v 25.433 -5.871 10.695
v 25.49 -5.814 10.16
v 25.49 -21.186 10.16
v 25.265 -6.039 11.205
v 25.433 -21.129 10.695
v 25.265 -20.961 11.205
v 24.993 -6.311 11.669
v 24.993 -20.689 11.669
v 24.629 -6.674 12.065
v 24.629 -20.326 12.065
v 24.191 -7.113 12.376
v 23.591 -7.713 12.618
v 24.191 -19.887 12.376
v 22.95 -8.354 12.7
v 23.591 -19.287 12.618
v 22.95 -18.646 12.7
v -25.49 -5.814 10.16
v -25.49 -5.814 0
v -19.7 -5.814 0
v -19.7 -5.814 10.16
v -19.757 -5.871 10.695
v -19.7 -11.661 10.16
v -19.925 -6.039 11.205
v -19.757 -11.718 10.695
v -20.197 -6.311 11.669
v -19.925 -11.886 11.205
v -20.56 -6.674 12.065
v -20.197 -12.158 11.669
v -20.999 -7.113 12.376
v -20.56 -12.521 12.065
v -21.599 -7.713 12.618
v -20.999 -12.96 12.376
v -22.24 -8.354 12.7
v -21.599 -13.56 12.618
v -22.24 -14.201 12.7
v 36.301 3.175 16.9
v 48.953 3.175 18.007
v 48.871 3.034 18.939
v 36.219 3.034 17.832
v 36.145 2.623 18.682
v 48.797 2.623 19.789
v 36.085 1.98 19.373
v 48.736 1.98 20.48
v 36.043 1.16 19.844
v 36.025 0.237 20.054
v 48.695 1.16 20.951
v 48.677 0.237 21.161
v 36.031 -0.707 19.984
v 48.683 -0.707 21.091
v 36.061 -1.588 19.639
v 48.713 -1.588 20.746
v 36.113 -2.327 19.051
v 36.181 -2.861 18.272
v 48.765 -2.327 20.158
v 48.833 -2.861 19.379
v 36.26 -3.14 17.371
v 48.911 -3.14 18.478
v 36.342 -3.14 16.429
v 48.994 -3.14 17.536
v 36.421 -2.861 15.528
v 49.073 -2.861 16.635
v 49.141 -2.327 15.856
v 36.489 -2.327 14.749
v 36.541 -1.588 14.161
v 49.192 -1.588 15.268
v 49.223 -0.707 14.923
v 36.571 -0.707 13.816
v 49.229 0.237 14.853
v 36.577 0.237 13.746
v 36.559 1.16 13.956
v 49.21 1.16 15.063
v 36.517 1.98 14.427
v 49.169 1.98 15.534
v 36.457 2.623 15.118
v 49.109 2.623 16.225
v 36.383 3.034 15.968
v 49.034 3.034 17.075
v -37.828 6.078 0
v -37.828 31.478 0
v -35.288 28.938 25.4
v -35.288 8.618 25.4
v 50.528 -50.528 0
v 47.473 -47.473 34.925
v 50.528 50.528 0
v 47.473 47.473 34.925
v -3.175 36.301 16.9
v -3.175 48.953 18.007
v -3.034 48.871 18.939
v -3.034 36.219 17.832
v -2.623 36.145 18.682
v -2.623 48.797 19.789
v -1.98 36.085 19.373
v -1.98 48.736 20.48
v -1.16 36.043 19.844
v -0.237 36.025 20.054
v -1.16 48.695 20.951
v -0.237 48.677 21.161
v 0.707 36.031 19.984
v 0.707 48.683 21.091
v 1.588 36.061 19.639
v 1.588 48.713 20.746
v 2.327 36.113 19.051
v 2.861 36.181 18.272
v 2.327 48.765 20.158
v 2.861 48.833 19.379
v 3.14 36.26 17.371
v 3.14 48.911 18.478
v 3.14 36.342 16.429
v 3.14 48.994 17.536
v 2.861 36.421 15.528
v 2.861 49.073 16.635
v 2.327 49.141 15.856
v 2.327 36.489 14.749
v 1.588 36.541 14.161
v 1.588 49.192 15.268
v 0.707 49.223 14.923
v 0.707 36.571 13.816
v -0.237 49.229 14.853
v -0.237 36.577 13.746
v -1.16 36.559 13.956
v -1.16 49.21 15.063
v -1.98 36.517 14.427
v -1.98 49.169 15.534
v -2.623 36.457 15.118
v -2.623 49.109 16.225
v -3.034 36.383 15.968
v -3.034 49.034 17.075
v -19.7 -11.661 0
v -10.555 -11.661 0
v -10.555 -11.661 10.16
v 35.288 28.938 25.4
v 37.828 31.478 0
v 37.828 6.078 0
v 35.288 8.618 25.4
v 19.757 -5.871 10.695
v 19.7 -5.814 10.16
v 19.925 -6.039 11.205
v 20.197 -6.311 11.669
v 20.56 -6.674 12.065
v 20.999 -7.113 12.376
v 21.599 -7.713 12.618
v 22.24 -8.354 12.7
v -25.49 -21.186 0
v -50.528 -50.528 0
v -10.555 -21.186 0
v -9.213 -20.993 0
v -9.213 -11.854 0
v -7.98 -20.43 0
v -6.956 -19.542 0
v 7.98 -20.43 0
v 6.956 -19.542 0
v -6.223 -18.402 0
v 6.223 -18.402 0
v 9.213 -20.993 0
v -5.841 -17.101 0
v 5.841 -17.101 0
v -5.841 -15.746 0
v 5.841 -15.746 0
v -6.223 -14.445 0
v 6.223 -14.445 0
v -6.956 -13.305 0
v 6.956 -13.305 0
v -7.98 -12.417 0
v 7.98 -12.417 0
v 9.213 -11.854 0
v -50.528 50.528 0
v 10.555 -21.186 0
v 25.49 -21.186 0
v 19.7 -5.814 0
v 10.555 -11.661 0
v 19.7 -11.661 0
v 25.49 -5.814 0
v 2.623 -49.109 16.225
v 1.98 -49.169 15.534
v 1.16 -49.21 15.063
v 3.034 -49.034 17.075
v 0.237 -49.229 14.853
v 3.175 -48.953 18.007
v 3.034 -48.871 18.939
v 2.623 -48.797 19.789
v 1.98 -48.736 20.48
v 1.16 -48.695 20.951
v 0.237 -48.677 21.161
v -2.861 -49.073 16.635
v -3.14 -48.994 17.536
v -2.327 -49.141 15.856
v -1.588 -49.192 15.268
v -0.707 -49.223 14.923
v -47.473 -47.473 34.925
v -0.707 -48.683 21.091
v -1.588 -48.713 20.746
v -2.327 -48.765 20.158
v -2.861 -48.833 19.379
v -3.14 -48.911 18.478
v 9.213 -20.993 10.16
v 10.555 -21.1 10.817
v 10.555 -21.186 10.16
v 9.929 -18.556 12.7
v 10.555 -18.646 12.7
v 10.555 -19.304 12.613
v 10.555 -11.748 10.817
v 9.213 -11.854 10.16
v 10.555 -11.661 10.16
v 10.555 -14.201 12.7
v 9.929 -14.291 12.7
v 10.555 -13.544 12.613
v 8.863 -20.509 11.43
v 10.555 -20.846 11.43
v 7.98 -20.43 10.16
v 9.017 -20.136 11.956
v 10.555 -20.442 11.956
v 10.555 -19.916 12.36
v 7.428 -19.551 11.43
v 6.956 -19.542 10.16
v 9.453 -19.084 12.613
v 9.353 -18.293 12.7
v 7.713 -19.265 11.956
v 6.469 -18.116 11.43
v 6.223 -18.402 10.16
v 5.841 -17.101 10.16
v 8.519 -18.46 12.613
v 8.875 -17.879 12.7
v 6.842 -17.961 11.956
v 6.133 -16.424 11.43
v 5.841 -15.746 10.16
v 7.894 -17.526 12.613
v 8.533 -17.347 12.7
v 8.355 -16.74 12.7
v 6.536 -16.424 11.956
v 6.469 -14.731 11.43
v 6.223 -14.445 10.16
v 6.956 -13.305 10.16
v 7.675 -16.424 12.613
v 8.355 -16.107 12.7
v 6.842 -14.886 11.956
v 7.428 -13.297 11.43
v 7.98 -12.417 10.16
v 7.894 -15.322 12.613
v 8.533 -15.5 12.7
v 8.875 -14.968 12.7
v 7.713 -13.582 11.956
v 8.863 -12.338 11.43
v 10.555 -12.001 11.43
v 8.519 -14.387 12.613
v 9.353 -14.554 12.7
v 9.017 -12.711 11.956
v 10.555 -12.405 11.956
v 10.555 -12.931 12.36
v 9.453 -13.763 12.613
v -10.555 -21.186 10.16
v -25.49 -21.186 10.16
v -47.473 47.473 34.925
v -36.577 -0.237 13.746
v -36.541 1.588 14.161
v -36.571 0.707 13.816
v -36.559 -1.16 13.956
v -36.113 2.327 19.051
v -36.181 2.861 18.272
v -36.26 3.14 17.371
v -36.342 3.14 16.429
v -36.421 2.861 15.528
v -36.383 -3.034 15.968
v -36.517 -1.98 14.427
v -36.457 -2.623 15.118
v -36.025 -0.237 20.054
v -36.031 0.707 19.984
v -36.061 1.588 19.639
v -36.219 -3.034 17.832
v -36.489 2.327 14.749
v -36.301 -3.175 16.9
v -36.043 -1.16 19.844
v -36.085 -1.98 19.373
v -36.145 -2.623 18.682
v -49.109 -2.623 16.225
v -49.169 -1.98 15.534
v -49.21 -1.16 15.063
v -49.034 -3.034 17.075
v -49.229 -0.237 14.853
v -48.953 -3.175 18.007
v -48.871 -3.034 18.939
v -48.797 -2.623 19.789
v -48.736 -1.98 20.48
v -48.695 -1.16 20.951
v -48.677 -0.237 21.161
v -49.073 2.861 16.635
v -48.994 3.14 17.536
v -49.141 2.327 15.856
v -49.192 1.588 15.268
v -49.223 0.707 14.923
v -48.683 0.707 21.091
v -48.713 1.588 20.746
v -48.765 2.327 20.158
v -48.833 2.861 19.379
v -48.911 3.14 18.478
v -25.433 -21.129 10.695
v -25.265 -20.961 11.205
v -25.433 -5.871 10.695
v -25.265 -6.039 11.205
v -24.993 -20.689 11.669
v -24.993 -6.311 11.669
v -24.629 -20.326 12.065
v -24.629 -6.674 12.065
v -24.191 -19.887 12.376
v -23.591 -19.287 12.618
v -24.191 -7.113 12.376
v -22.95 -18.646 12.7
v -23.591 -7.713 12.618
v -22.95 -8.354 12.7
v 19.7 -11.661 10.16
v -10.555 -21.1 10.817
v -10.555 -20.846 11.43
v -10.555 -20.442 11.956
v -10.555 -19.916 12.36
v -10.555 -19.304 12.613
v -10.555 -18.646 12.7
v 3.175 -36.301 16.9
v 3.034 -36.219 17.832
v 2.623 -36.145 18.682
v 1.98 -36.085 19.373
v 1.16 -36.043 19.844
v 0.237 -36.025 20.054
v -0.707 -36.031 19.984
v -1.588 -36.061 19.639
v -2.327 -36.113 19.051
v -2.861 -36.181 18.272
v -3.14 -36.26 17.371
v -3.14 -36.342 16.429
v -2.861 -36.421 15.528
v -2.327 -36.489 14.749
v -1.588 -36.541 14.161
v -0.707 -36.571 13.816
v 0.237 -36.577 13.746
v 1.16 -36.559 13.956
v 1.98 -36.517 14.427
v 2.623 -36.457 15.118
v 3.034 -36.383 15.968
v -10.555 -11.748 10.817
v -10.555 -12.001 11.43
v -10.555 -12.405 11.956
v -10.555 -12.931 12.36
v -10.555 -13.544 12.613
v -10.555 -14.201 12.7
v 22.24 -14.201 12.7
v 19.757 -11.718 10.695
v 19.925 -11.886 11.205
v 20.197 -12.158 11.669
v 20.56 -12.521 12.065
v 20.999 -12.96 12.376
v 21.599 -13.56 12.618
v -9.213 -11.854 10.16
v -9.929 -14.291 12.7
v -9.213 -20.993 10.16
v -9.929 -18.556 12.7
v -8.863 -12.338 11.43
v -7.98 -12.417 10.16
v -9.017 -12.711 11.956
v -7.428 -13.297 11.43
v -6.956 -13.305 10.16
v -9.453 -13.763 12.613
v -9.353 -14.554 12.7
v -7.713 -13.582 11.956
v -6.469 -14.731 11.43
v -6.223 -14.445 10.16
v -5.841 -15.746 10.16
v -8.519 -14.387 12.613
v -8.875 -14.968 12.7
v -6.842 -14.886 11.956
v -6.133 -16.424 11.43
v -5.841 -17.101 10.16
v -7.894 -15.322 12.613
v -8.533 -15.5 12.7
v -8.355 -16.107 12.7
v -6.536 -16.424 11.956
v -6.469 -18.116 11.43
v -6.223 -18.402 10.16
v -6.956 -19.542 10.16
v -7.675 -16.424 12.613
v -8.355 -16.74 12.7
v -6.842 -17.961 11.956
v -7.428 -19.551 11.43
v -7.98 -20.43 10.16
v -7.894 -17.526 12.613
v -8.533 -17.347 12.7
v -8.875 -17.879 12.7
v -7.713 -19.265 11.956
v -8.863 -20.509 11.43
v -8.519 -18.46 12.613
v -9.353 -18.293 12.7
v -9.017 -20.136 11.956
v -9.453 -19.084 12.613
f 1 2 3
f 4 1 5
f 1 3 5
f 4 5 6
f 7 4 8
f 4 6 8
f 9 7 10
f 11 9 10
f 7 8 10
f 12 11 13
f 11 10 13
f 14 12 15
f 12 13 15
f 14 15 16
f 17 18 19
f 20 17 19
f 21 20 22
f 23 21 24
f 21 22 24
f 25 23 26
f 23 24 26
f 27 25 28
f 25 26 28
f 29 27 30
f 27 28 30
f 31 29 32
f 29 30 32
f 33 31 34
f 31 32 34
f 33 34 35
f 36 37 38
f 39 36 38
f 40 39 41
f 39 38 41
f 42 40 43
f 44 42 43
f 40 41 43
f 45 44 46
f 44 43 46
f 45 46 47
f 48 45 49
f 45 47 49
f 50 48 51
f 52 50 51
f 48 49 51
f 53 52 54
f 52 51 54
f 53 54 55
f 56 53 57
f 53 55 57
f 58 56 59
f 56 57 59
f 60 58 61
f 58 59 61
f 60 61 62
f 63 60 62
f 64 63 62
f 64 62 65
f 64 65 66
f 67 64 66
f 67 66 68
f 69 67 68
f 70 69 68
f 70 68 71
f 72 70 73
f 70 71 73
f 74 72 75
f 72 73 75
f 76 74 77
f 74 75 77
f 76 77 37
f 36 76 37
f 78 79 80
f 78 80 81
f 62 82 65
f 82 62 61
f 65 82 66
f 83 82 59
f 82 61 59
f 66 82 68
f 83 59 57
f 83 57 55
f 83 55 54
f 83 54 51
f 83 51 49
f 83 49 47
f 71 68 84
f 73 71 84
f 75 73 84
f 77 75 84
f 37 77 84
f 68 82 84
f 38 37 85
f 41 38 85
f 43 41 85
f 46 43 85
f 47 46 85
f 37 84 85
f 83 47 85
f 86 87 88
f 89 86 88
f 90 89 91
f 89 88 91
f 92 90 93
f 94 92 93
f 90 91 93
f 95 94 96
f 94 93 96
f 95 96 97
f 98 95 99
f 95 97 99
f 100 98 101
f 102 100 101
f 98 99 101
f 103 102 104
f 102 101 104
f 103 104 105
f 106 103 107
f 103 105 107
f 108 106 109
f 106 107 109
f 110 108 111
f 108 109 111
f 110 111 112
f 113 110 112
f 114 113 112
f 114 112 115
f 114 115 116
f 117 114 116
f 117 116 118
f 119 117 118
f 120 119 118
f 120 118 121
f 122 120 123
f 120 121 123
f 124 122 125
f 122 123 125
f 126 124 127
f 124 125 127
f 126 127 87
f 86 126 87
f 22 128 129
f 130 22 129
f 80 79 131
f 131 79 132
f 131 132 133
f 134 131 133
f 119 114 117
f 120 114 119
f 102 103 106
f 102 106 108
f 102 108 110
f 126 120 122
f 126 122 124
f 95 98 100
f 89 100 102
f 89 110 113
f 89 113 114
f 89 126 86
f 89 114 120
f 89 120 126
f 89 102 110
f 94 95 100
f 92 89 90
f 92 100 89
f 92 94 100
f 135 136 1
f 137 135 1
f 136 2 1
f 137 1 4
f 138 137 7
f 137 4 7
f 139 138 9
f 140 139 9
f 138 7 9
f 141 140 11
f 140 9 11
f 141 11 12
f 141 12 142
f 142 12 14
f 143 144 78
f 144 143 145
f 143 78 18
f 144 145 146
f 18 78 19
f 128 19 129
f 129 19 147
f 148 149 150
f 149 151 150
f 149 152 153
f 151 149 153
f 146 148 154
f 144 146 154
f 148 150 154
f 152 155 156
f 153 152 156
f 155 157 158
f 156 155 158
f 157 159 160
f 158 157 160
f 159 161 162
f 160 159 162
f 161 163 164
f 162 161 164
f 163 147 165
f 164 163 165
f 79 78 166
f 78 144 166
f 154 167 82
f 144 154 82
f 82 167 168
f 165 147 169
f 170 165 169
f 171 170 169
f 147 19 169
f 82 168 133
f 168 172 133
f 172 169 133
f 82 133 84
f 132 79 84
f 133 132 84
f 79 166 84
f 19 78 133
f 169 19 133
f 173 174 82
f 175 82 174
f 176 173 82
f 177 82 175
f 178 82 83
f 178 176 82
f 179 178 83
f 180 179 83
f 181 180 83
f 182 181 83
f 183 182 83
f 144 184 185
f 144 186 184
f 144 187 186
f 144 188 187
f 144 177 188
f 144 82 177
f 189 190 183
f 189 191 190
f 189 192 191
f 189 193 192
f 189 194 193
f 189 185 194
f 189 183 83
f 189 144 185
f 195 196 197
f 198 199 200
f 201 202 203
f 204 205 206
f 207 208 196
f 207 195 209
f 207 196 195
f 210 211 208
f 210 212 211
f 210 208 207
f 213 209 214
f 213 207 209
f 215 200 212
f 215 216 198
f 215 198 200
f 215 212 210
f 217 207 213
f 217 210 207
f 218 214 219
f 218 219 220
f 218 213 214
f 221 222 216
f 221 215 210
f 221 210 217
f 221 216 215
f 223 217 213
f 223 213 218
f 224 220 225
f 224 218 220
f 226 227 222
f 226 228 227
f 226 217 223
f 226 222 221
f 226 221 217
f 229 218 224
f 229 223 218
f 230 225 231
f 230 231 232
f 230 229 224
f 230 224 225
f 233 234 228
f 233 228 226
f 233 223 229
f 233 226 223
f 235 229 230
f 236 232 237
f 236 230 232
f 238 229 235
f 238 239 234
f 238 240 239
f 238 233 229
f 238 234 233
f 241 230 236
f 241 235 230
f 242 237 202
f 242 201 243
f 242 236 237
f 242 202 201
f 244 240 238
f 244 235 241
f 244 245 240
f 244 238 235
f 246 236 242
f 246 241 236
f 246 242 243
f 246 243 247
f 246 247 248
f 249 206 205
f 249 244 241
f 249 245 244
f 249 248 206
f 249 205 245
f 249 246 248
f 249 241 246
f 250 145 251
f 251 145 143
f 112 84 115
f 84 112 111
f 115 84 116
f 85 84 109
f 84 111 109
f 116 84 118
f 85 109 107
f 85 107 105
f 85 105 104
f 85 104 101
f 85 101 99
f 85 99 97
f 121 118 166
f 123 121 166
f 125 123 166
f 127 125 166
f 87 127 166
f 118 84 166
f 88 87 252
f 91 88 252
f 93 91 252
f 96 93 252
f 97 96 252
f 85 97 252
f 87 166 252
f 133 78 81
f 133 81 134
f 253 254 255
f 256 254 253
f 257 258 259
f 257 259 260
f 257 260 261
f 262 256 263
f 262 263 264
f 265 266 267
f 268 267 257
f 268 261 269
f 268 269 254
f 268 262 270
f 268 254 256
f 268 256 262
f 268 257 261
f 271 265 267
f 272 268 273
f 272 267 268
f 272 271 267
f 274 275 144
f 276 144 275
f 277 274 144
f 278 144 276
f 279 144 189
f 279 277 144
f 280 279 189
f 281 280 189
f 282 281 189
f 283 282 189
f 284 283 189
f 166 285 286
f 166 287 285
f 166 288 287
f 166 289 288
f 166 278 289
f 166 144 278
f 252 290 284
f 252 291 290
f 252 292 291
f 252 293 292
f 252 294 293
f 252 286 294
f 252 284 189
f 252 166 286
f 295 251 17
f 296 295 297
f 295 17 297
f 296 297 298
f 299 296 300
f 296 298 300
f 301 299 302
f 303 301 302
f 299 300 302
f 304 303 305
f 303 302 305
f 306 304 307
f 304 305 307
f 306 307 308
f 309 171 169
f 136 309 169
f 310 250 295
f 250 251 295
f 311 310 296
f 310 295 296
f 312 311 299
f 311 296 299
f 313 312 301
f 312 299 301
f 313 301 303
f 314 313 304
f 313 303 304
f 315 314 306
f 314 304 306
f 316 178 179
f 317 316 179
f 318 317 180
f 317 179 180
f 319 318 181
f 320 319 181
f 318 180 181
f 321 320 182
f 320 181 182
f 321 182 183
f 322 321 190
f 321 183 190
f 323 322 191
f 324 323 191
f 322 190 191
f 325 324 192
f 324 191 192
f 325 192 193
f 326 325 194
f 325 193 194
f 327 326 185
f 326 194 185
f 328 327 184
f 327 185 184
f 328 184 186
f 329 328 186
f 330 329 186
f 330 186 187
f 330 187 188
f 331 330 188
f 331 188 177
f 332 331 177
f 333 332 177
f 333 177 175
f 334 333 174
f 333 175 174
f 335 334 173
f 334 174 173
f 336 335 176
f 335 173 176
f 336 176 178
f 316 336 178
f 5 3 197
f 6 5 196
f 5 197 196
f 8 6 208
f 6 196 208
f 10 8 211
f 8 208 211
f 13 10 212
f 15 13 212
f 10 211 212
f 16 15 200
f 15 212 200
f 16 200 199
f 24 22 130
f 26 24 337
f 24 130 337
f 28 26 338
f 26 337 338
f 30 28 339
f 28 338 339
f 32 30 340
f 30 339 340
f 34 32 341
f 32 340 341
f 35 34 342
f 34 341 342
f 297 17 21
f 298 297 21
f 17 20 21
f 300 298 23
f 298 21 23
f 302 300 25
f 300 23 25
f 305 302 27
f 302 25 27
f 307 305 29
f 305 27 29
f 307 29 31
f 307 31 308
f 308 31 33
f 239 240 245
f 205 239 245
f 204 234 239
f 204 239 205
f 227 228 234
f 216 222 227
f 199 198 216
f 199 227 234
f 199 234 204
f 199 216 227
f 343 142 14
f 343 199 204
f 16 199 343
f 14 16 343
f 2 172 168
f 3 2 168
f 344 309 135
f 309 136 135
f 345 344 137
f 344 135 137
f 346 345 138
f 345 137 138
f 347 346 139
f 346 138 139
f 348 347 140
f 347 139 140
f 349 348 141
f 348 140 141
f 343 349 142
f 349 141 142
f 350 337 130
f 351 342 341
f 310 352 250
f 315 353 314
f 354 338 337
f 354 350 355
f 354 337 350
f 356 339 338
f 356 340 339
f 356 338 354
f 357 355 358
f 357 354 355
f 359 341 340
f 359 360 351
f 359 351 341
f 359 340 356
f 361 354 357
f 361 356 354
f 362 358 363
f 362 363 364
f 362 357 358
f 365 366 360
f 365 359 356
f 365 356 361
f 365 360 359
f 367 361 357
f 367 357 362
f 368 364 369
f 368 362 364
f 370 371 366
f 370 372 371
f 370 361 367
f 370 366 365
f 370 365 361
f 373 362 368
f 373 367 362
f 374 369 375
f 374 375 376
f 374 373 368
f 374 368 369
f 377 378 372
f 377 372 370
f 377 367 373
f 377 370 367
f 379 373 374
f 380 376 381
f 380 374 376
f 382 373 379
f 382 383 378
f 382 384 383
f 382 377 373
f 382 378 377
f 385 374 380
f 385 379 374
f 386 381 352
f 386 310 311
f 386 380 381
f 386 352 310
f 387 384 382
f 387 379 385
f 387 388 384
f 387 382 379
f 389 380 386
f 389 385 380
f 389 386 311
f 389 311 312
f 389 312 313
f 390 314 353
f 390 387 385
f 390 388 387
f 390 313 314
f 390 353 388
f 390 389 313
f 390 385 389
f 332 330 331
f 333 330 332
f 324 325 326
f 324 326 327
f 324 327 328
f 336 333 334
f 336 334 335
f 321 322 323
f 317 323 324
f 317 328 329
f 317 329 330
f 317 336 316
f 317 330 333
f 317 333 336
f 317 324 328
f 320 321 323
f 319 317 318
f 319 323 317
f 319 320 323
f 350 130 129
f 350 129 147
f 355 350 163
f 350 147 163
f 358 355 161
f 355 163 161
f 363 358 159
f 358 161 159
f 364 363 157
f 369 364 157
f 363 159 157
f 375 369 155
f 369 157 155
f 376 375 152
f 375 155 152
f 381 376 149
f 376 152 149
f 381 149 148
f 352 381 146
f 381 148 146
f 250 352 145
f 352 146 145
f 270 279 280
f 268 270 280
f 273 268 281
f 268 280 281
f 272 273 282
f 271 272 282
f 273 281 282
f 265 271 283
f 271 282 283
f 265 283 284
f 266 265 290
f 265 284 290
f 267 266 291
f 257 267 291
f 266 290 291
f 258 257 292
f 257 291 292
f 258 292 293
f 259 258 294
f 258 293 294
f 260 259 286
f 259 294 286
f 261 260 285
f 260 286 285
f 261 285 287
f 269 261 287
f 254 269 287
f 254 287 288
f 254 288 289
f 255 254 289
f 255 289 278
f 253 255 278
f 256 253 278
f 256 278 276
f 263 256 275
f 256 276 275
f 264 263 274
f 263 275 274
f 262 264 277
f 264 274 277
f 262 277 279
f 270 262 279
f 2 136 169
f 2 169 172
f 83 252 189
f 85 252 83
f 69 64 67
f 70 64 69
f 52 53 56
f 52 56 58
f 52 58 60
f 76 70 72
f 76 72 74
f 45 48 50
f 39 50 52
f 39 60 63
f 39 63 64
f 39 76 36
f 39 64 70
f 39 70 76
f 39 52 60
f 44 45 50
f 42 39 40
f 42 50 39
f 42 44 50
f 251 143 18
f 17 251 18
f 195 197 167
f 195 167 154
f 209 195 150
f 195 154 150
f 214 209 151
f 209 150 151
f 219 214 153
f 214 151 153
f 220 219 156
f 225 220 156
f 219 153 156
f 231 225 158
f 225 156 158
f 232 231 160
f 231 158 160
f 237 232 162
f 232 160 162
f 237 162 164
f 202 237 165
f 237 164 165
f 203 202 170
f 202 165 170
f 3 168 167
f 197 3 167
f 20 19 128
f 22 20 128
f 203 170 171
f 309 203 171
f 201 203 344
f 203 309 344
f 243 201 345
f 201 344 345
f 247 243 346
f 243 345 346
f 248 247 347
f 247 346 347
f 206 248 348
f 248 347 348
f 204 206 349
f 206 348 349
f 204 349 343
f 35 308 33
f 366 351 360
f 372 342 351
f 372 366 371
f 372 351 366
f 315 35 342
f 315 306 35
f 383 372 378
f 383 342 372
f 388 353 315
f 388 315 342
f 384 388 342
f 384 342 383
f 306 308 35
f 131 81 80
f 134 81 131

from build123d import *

# Parameters (mm, degrees)
F0_W        = 101.6
F0_H        = 101.6
F1_DEPTH    = 34.925
F2_T1_DEPTH = 299.3404177556
F2_T3_DEPTH = 299.3404177556
F3_R        = 3.175
F4_DEPTH    = 12.7
F5_R        = 3.175
F6_DEPTH    = 12.7
F7_R        = 3.175
F8_DEPTH    = 12.7
F9_R        = 3.175
F10_DEPTH   = 12.7
F11_W       = 75.6562831473
F11_H       = 25.4
F12_DEPTH   = 25.4
F13_SIZE2   = 25.39999
F13_SIZE    = 2.53999
F15_DEPTH   = 12.7
F16_R       = 2.54


# Not quite as in the source:
# - a fillet or chamfer that OpenCascade refuses, or shapes differently, is made with other operations: its cross-section is extruded or revolved along the edge and cut away or added
# - a fillet or chamfer is up to 0.001 mm smaller than in the source, because OpenCascade refuses the exact size


with BuildPart() as f1:
    # F0 (on Top) → F1 (new body)
    with BuildSketch(Plane.XY):
        Rectangle(F0_W, F0_H)
    extrude(amount=F1_DEPTH)

    # F2: chamfer of 3.3274 x 38.0323560322 on 4 edges, made by hand

    # F2_s2 → F2_t1 (cut)
    with BuildSketch(Plane.XZ.offset(-149.6702088778)):
        Polygon((-50.8, -3.1073560322), (-47.4726, 34.925), (-50.8, 34.925), align=None)
        Polygon((50.8, -3.1073560322), (47.4726, 34.925), (50.8, 34.925), align=None)
    extrude(amount=F2_T1_DEPTH, mode=Mode.SUBTRACT)

    # F2_s4 → F2_t3 (cut)
    with BuildSketch(Plane.YZ.offset(-149.6702088778)):
        Polygon((-50.8, -3.1073560322), (-47.4726, 34.925), (-50.8, 34.925), align=None)
        Polygon((50.8, -3.1073560322), (47.4726, 34.925), (50.8, 34.925), align=None)
    extrude(amount=F2_T3_DEPTH, mode=Mode.SUBTRACT)

    # F3 (on face) → F4 (cut)
    with BuildSketch(Plane(origin=(0, 50.1443235703, 4.3870598526), x_dir=(-1, 0, 0), z_dir=(0, 0.9961946981, 0.0871557427))):
        with Locations((0, 13.6719250414)):
            Circle(F3_R)
    extrude(amount=-F4_DEPTH, mode=Mode.SUBTRACT)

    # F5 (on face) → F6 (cut)
    with BuildSketch(Plane(origin=(0, -50.1443235703, 4.3870598526), x_dir=(1, 0, 0), z_dir=(0, -0.9961946981, 0.0871557427))):
        with Locations((0, 13.6719250414)):
            Circle(F5_R)
    extrude(amount=-F6_DEPTH, mode=Mode.SUBTRACT)

    # F7 (on face) → F8 (cut)
    with BuildSketch(Plane(origin=(50.1443235703, 0, 4.3870598526), x_dir=(0, 1, 0), z_dir=(0.9961946981, 0, 0.0871557427))):
        with Locations((0, 13.6719250414)):
            Circle(F7_R)
    extrude(amount=-F8_DEPTH, mode=Mode.SUBTRACT)

    # F9 (on face) → F10 (cut)
    with BuildSketch(Plane(origin=(-50.1443235703, 0, 4.3870598526), x_dir=(0, -1, 0), z_dir=(-0.9961946981, 0, 0.0871557427))):
        with Locations((0, 13.6719250414)):
            Circle(F9_R)
    extrude(amount=-F10_DEPTH, mode=Mode.SUBTRACT)

    # F11 (on face) → F12 (cut)
    with BuildSketch(Plane(origin=(0, 0, 0), x_dir=(1, 0, 0), z_dir=(0, 0, -1))):
        with Locations((0, -18.7781415736)):
            Rectangle(F11_W, F11_H)
    extrude(amount=-F12_DEPTH, mode=Mode.SUBTRACT)

    # F13 (size 2.54 and 25.4 in the source; OpenCascade refuses exactly that, so slightly less here)
    f13_edges = [f1.edges().sort_by_distance(p)[0] for p in [
        (0, 6.078142, 25.4),
        (-37.828142, 18.778142, 25.4),
        (0, 31.478142, 25.4),
        (37.828142, 18.778142, 25.4),
    ]]
    f13_side = f1.faces().sort_by_distance((0, 18.778142, 25.4))[0]
    chamfer(f13_edges, length=F13_SIZE, length2=F13_SIZE2, reference=f13_side)

    # F14 (on face) → F15 (cut)
    with BuildSketch(Plane(origin=(0, 0, 0), x_dir=(1, 0, 0), z_dir=(0, 0, -1))):
        with BuildLine():
            Line((-19.6998585016, 11.6611556837), (-10.5549017823, 11.6611556837))
            ThreePointArc((-10.5549017823, 11.6611556837), (-5.7924017823, 16.4236556837), (-10.5549017823, 21.1861556837))
            Line((-10.5549017823, 21.1861556837), (-19.6998585016, 21.1861556837))
            Line((-19.6998585016, 21.1861556837), (-25.4897605628, 21.1861556837))
            Line((-25.4897605628, 21.1861556837), (-25.4897605628, 11.6611556837))
            Line((-25.4897605628, 11.6611556837), (-25.4897605628, 5.814129021))
            Line((-25.4897605628, 5.814129021), (-19.6998585016, 5.814129021))
            Line((-19.6998585016, 5.814129021), (-19.6998585016, 11.6611556837))
        make_face()
        with BuildLine():
            Line((25.4897605628, 11.6611556837), (25.4897605628, 21.1861556837))
            Line((25.4897605628, 21.1861556837), (19.6998585016, 21.1861556837))
            Line((19.6998585016, 21.1861556837), (10.5549017823, 21.1861556837))
            ThreePointArc((10.5549017823, 21.1861556837), (5.7924017823, 16.4236556837), (10.5549017823, 11.6611556837))
            Line((10.5549017823, 11.6611556837), (19.6998585016, 11.6611556837))
            Line((19.6998585016, 11.6611556837), (19.6998585016, 5.814129021))
            Line((19.6998585016, 5.814129021), (25.4897605628, 5.814129021))
            Line((25.4897605628, 5.814129021), (25.4897605628, 11.6611556837))
        make_face()
    extrude(amount=-F15_DEPTH, mode=Mode.SUBTRACT)

    # F16
    f16_edges = [f1.edges().sort_by_distance(p)[0] for p in [
        (-15.12738, -11.661156, 12.7),
        (-5.792402, -16.423656, 12.7),
        (-18.022331, -21.186156, 12.7),
        (-25.489761, -13.500142, 12.7),
        (-22.59481, -5.814129, 12.7),
        (-19.699859, -8.737642, 12.7),
        (18.022331, -21.186156, 12.7),
        (5.792402, -16.423656, 12.7),
        (15.12738, -11.661156, 12.7),
        (19.699859, -8.737642, 12.7),
        (22.59481, -5.814129, 12.7),
        (25.489761, -13.500142, 12.7),
    ]]
    fillet(f16_edges, radius=F16_R)


solid = f1.part
